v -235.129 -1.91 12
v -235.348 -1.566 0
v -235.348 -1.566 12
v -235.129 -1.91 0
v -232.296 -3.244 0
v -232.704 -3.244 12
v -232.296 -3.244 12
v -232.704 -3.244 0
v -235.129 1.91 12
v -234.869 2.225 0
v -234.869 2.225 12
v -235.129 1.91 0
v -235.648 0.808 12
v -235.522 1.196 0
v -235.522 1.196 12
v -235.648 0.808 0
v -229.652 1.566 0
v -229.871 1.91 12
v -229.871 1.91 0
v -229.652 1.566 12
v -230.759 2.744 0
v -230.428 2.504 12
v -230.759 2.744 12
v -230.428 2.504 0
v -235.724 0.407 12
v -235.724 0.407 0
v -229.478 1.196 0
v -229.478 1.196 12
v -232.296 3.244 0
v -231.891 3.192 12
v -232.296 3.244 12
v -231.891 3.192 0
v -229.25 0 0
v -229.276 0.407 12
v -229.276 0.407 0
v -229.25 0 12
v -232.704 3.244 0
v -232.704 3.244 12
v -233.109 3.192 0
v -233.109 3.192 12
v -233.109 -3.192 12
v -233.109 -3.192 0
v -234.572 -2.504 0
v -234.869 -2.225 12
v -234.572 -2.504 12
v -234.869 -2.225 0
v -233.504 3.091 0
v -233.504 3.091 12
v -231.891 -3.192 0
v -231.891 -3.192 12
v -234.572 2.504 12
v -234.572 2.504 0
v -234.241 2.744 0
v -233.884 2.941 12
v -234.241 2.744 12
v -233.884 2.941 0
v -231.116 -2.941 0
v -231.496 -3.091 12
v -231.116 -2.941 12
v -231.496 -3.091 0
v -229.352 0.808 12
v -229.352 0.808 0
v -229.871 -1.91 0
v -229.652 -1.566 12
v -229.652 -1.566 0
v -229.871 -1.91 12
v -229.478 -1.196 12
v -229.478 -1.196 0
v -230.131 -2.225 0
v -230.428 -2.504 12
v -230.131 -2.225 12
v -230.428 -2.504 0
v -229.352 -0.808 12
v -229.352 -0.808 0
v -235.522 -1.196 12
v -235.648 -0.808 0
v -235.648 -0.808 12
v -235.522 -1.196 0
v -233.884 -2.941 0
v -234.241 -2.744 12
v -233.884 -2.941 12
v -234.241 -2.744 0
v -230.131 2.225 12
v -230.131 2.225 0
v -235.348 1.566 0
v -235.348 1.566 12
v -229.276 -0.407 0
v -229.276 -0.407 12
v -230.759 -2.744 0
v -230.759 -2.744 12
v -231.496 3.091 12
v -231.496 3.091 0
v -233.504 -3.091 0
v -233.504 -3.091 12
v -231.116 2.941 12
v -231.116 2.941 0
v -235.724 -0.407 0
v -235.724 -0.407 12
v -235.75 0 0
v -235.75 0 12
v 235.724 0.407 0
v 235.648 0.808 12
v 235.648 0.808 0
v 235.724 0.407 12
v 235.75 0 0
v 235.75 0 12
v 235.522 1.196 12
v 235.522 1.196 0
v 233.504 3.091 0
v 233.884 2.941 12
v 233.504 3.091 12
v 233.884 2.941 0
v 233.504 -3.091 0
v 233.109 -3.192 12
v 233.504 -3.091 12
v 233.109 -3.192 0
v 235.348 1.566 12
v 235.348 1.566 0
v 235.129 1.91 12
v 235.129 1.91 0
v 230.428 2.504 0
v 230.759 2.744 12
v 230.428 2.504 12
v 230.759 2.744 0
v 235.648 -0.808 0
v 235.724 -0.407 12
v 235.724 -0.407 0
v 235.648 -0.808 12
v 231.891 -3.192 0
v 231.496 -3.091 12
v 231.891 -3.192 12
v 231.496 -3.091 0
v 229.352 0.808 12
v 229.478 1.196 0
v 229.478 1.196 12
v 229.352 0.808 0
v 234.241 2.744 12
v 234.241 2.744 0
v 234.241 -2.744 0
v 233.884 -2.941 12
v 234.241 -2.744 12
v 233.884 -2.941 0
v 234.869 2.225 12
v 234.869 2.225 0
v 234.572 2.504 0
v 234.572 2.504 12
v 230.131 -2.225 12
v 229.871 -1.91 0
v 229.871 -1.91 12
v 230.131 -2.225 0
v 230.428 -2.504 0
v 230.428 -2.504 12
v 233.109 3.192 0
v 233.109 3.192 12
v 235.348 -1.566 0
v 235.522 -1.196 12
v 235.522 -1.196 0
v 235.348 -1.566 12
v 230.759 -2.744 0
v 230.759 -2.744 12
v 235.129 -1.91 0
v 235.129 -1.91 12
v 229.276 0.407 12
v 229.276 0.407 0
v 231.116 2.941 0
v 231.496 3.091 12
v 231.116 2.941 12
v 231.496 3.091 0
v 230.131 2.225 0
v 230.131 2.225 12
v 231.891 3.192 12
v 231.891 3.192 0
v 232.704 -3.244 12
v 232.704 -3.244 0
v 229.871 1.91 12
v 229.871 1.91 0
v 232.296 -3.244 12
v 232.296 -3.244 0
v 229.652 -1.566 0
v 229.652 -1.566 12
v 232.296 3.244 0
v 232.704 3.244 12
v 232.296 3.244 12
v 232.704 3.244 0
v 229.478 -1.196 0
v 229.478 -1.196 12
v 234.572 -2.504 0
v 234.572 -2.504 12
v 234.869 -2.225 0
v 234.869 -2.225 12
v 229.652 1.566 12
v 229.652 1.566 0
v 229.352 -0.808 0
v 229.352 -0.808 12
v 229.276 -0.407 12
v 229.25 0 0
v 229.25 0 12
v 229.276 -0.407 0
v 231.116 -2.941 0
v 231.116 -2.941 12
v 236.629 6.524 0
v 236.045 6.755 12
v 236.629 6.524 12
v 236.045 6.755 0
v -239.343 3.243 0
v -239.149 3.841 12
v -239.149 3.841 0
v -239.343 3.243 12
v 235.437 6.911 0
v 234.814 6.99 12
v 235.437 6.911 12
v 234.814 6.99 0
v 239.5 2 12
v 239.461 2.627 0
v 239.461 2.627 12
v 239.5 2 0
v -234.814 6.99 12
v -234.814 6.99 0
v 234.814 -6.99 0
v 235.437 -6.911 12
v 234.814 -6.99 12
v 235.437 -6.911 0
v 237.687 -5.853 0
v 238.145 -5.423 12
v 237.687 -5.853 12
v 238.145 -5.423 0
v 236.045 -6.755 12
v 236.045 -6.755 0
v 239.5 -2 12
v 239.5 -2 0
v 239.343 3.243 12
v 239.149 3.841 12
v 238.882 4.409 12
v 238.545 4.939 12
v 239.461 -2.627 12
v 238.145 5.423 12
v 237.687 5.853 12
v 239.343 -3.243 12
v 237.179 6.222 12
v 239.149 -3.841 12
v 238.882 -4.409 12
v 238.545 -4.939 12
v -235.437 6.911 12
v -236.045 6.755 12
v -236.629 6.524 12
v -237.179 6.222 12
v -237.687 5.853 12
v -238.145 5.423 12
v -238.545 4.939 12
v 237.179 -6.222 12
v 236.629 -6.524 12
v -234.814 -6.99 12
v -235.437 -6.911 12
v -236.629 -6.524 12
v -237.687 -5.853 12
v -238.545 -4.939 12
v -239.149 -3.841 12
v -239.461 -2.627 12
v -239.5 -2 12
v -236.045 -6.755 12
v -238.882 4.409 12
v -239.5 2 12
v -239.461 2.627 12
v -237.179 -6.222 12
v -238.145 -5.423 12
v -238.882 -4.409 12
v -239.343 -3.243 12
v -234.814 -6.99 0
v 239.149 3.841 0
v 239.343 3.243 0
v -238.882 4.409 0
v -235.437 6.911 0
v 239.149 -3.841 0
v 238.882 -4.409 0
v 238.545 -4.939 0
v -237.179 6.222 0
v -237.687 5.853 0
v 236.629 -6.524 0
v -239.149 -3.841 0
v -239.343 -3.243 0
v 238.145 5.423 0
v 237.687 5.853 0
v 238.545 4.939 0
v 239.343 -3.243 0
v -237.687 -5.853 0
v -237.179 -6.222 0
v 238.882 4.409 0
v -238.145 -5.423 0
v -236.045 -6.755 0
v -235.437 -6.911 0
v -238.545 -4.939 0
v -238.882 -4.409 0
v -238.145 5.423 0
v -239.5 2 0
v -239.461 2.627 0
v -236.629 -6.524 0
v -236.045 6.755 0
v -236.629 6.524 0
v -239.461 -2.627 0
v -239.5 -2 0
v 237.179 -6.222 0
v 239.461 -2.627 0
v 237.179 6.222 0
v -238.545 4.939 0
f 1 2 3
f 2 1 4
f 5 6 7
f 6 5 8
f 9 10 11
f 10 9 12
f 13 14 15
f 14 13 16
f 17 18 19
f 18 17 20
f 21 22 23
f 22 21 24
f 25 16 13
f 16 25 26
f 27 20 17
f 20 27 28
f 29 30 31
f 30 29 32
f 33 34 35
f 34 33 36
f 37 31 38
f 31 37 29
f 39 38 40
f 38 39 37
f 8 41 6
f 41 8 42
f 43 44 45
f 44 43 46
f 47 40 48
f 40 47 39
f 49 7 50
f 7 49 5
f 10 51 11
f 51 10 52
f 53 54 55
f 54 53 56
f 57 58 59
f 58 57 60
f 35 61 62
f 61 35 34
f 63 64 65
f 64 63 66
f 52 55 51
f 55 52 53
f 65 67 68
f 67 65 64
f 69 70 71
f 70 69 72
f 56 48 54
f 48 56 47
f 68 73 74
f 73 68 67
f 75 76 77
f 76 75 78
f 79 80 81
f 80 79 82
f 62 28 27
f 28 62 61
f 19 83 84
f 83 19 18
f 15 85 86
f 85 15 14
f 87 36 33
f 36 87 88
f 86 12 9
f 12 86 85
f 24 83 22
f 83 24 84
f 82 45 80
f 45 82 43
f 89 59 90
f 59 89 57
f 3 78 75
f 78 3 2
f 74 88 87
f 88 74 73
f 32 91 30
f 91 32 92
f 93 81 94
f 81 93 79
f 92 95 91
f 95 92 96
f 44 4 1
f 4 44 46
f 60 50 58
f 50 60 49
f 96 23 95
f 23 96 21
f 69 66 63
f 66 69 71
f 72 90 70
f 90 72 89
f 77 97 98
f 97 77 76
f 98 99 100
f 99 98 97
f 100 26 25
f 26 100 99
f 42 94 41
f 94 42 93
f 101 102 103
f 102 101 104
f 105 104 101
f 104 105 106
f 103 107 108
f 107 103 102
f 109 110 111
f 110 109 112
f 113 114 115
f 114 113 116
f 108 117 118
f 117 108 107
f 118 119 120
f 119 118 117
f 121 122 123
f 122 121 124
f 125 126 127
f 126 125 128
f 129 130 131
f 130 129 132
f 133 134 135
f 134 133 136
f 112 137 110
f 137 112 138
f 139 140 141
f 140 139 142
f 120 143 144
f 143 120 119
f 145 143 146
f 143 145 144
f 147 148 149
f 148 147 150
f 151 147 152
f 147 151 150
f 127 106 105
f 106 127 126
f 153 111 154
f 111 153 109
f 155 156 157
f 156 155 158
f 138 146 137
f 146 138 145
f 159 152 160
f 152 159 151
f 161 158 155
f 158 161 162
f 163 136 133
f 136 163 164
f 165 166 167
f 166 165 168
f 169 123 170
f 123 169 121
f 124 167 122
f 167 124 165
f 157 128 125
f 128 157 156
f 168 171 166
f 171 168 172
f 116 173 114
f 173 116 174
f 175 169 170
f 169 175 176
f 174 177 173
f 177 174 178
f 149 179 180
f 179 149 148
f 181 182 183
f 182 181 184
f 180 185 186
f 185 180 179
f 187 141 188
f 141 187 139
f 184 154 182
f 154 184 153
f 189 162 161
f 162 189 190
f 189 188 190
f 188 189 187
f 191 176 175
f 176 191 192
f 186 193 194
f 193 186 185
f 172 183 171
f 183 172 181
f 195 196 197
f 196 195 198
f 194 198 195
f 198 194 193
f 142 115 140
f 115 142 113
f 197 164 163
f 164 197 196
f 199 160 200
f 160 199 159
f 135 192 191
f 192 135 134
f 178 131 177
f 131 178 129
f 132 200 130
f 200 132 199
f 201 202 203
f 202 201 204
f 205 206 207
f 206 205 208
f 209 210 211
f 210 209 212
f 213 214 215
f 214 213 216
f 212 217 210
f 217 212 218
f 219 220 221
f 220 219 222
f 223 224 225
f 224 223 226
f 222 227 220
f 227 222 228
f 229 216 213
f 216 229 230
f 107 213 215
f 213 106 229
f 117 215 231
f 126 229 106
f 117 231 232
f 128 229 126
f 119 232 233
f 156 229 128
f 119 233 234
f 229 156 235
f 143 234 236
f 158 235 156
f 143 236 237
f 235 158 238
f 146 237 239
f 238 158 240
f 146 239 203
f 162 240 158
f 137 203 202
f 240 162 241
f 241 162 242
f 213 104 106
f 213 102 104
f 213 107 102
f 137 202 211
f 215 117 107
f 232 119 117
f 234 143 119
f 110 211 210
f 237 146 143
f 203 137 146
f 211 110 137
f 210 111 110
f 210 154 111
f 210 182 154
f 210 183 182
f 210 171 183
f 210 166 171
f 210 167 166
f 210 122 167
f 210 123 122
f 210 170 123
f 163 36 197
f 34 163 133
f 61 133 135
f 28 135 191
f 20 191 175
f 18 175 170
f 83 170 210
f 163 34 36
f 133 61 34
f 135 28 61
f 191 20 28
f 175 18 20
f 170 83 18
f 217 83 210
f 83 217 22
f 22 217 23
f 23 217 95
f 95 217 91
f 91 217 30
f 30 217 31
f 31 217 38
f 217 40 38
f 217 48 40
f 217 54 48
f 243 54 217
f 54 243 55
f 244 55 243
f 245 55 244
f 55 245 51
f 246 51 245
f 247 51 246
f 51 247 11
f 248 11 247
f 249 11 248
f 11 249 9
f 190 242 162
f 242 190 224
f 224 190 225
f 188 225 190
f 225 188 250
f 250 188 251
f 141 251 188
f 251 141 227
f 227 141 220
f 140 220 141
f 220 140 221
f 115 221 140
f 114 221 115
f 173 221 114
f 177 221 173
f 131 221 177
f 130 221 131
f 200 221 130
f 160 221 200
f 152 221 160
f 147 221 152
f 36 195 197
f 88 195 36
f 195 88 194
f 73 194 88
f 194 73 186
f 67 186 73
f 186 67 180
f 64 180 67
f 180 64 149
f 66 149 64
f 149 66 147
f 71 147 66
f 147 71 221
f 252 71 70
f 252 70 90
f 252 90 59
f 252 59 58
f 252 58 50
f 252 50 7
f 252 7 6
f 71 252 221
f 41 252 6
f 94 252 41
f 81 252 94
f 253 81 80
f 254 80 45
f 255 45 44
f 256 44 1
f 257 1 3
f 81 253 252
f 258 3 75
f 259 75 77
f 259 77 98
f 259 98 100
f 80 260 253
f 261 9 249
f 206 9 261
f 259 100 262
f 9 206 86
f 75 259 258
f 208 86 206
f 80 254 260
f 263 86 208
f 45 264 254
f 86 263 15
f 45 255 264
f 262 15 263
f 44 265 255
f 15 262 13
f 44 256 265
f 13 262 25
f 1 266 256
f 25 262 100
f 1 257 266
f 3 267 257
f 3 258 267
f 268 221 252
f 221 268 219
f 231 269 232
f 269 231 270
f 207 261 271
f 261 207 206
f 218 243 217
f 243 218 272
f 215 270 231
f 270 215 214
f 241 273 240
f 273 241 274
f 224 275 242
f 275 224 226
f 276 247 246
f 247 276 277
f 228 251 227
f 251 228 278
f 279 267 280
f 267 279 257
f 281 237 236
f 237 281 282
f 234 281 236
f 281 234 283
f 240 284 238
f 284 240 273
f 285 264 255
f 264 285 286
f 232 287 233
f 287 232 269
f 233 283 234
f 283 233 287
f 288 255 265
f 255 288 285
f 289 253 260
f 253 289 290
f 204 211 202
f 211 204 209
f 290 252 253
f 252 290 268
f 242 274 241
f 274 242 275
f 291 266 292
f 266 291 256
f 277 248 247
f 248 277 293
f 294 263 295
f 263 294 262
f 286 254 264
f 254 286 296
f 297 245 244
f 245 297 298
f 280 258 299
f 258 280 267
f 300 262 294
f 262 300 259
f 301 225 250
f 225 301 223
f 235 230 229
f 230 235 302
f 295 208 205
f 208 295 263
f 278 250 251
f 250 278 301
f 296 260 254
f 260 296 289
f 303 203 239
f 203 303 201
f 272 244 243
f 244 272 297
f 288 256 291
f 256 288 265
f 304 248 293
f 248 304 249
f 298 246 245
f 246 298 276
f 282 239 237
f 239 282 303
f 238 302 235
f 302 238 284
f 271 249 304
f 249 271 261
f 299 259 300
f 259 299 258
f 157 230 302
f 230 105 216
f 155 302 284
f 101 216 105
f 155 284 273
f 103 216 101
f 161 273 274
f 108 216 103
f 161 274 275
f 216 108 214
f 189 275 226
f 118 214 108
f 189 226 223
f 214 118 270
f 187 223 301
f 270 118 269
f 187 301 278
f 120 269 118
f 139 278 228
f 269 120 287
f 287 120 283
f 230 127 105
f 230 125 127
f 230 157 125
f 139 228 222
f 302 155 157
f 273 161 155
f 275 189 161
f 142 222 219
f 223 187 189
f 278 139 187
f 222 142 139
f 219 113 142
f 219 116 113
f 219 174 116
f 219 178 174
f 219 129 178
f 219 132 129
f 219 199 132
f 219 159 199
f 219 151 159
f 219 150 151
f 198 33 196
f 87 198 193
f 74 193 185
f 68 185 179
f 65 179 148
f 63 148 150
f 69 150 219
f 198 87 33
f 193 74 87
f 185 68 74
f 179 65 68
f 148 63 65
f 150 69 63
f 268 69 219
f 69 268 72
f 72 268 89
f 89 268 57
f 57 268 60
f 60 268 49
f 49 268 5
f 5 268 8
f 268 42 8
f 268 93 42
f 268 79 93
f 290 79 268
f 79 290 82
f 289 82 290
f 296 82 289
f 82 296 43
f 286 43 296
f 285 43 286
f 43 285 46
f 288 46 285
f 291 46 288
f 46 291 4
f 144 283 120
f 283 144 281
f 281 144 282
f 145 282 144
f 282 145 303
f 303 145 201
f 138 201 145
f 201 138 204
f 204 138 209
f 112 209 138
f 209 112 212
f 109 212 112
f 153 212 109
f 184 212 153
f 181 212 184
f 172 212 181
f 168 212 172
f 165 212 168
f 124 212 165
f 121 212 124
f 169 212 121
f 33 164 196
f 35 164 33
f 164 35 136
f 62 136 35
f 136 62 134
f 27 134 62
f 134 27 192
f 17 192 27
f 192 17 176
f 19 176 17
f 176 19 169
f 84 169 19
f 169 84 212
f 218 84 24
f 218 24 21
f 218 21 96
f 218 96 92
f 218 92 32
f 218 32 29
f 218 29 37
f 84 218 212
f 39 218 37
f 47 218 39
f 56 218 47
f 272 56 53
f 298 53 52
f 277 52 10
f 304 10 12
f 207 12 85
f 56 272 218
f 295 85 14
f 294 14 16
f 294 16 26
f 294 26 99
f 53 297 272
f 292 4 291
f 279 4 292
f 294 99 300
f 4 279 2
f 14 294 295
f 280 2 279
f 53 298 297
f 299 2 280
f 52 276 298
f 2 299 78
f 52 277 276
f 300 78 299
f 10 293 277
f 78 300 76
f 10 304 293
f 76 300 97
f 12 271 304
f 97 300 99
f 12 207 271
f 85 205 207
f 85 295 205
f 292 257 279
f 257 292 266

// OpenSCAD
$fn = 50;


difference() {
	union() {
		hull() {
			translate(v = [-234.5000000000, 2.0000000000, 0]) {
				cylinder(h = 12, r = 5);
			}
			translate(v = [234.5000000000, 2.0000000000, 0]) {
				cylinder(h = 12, r = 5);
			}
			translate(v = [-234.5000000000, -2.0000000000, 0]) {
				cylinder(h = 12, r = 5);
			}
			translate(v = [234.5000000000, -2.0000000000, 0]) {
				cylinder(h = 12, r = 5);
			}
		}
	}
	union() {
		translate(v = [-232.5000000000, 0.0000000000, -100.0000000000]) {
			cylinder(h = 200, r = 3.2500000000);
		}
		translate(v = [-232.5000000000, 0.0000000000, -100.0000000000]) {
			cylinder(h = 200, r = 3.2500000000);
		}
		translate(v = [232.5000000000, 0.0000000000, -100.0000000000]) {
			cylinder(h = 200, r = 3.2500000000);
		}
		translate(v = [232.5000000000, 0.0000000000, -100.0000000000]) {
			cylinder(h = 200, r = 3.2500000000);
		}
	}
}
